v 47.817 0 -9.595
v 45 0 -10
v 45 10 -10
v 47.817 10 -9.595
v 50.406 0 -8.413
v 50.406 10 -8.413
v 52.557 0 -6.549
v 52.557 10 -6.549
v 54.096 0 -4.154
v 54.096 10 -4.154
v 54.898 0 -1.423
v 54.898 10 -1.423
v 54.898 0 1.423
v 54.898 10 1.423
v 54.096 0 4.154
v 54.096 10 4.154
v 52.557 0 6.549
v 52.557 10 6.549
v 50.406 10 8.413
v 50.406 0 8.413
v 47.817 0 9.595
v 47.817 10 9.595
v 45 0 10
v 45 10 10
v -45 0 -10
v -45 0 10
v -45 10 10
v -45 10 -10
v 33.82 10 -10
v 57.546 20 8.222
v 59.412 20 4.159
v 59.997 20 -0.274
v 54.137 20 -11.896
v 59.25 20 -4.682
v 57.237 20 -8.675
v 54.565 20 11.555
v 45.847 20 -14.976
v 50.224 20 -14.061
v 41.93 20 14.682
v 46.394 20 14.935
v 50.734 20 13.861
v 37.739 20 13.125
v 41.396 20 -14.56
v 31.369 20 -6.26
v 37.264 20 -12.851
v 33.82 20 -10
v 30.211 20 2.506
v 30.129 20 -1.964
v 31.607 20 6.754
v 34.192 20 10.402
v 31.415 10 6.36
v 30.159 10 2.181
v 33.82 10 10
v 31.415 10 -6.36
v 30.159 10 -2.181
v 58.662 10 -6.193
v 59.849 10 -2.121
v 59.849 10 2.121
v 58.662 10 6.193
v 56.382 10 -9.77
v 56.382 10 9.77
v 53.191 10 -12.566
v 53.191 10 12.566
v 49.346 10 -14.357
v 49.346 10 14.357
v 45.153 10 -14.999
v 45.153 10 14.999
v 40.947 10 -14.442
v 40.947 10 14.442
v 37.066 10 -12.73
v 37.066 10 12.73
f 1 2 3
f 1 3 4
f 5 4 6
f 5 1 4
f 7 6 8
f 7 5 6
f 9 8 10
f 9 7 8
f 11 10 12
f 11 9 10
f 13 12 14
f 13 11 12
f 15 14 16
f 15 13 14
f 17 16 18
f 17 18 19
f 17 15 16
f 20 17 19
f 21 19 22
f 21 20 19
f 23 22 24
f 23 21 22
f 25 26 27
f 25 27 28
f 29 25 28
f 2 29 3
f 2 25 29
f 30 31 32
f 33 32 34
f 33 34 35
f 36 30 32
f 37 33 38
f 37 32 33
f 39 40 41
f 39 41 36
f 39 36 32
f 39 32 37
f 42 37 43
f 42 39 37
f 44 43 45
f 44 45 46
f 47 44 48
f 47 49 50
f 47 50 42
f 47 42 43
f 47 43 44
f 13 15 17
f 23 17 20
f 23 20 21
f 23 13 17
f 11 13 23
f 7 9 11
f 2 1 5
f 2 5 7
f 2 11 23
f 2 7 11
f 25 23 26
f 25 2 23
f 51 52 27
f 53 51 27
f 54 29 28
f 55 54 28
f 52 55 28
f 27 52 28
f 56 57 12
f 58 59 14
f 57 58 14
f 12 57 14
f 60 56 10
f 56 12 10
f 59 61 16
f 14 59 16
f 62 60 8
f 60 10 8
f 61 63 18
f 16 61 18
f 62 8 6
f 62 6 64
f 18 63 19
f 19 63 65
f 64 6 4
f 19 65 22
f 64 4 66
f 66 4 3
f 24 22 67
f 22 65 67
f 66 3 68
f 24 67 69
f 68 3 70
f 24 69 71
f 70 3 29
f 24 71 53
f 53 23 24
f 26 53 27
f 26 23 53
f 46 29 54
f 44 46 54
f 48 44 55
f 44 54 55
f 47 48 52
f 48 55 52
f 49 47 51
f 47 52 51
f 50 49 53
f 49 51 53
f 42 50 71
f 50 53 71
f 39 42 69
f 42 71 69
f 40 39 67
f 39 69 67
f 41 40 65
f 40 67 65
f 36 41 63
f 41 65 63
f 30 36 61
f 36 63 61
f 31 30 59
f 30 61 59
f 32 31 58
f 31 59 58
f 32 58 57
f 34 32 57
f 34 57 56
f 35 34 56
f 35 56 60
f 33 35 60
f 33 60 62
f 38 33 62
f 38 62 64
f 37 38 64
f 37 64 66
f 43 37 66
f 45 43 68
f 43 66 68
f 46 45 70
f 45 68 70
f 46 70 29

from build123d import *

# Parameters (mm, degrees)
ARM1_DEPTH          = 10
SKETCH3_R           = 15
BOSS_EXTRUDE2_DEPTH = 10


with BuildPart() as part:
    # Sketch1 → arm1 (new body)
    with BuildSketch(Plane(origin=(0, 0, 0), x_dir=(1, 0, 0), z_dir=(0, 1, 0))):
        with BuildLine():
            Line((-45, 10), (45, 10))
            ThreePointArc((45, 10), (55, 0), (45, -10))
            Line((45, -10), (-45, -10))
            Line((-45, -10), (-45, 10))
        make_face()
    extrude(amount=ARM1_DEPTH)

    # Sketch3 → Boss-Extrude2 (add)
    with BuildSketch(Plane(origin=(0, 10, 0), x_dir=(1, 0, 0), z_dir=(0, 1, 0))):
        with Locations(Location((45, 0, 0), (0, 0, 138.189685104))):
            Circle(SKETCH3_R)
    extrude(amount=BOSS_EXTRUDE2_DEPTH)


solid = part.part
